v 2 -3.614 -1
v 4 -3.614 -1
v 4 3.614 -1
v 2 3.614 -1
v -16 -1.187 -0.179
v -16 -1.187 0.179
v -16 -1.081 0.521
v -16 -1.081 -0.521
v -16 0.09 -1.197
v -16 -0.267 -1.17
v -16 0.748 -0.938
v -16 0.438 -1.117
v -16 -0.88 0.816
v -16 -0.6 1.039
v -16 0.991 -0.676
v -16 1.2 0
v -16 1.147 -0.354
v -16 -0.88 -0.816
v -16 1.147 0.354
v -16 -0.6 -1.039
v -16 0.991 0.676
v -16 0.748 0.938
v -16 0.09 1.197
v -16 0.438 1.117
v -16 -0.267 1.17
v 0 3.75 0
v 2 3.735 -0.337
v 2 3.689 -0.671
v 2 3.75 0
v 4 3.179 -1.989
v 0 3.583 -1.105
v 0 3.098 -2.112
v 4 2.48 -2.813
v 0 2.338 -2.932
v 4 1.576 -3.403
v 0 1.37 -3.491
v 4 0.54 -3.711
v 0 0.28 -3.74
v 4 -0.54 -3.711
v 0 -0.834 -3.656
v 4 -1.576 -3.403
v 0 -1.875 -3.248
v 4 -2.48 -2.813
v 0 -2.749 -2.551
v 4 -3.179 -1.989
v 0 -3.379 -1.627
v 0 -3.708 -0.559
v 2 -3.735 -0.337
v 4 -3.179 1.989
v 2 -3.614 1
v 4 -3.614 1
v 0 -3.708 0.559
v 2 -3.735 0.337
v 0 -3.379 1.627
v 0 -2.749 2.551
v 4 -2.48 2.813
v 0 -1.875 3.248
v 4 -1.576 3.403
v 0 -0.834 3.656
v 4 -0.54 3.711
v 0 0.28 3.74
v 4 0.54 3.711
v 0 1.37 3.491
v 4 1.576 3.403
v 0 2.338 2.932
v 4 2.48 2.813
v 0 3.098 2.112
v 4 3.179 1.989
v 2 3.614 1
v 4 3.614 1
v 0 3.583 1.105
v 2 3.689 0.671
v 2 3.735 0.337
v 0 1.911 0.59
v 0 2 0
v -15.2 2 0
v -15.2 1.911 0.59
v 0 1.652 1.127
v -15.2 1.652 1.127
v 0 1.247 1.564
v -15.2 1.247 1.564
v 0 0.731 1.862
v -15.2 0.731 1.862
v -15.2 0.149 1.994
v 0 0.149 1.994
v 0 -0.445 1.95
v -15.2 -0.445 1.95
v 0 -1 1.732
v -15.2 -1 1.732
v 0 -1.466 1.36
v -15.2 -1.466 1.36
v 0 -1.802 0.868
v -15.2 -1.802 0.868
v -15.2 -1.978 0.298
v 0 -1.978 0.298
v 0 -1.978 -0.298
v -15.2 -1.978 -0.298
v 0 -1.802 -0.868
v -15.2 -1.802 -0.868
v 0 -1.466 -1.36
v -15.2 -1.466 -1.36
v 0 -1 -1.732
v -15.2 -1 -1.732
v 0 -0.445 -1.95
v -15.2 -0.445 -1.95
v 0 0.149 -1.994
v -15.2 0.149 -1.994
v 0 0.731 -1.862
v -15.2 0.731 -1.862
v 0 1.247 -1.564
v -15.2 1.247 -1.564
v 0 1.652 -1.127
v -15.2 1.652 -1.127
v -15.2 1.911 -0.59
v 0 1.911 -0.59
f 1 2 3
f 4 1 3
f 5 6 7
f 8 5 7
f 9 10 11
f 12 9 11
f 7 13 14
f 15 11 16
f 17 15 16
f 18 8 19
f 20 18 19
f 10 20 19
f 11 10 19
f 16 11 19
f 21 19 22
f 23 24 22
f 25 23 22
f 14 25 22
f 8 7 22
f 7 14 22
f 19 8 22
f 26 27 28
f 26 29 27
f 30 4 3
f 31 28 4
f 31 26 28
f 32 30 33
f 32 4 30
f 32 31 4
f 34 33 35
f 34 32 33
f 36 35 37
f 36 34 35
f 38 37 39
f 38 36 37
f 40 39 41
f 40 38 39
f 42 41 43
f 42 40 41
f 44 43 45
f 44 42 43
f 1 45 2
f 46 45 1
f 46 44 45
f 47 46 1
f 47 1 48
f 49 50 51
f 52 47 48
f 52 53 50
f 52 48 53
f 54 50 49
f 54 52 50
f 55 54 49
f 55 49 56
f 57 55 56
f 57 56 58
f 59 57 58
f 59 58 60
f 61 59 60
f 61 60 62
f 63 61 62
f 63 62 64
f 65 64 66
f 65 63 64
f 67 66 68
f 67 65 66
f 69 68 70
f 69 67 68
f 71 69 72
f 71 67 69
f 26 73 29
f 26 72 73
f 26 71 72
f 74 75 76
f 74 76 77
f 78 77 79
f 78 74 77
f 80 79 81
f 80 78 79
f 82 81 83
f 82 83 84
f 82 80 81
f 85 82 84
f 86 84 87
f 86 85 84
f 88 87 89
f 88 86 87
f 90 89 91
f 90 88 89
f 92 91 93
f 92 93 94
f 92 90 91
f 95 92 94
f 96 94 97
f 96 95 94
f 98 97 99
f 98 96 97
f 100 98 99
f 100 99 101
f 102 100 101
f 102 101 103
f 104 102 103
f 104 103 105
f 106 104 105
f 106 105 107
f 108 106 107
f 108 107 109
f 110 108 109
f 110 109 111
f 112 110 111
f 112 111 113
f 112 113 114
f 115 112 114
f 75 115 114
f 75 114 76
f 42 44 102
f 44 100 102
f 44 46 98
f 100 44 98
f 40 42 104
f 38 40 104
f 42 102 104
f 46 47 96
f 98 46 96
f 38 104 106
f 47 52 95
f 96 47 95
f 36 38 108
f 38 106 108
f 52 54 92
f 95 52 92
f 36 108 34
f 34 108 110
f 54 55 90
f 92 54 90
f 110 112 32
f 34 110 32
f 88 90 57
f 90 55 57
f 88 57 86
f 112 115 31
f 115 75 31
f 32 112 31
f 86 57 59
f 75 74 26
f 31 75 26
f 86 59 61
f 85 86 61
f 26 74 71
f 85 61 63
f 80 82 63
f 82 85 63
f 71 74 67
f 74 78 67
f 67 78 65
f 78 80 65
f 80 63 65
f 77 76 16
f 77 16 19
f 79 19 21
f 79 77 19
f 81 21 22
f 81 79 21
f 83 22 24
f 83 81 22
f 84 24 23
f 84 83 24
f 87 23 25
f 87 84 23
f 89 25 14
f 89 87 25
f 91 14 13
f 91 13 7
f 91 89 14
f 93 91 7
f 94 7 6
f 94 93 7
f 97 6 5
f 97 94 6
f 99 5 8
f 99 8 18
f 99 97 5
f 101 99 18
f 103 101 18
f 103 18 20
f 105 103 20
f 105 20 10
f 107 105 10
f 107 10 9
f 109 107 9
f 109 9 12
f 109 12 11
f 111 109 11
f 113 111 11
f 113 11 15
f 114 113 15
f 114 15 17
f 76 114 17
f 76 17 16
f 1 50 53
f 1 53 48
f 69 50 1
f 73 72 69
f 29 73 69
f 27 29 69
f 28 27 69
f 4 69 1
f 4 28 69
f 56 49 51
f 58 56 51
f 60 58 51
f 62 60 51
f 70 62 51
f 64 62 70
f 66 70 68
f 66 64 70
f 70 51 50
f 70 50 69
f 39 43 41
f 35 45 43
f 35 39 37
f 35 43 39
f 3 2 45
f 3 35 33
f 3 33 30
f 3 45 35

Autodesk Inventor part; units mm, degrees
ref_plane "YZ Plane" through (0, 0, 0) normal (1, 0, 0) x (0, 1, 0)
ref_plane "XZ Plane" through (0, 0, 0) normal (0, 1, 0) x (-1, 0, 0)
ref_plane "XY Plane" through (0, 0, 0) normal (0, 0, 1) x (1, 0, 0)
sketch "Sketch1" plane through (0, 0, 0) normal (1, 0, 0) x (0, 1, 0)
  circle A0 centre (0, 0) radius 2
  circle A1 centre (0, 0) radius 3.75
  dimension "d0" = 4
  dimension "d1" = 7.5
extrude "Extrusion1" add sketch "Sketch1" against normal blind 16 contours A0
extrude "Extrusion2" add sketch "Sketch1" along normal blind 4 contours A0 | A1
sketch "Sketch2" plane through (4, 0, 0) normal (1, 0, 0) x (0, 0, -1)
  circle A0 centre (0, 0) radius 3.75 projected
  circle A1 centre (0, 0) radius 3.75 projected
  line L0 (-1, -3.6142) -> (-1, 3.6142)
  line L1 (1, -3.6142) -> (1, 3.6142)
  line L2 (0, 0) -> (0, 3.75)
  dimension "d15" = 2
extrude "Extrusion3" cut sketch "Sketch2" against normal blind 2 contours L1 A0 L0
chamfer "Chamfer1" distance 0.8 angle 45 1 edges at (-16, -2, 0)
thread "Thread2" size "M4x0.7" class "6g" standard "ANSI Metric M Profile" full length
properties part number "screw_M3-10" material "Сталь"
